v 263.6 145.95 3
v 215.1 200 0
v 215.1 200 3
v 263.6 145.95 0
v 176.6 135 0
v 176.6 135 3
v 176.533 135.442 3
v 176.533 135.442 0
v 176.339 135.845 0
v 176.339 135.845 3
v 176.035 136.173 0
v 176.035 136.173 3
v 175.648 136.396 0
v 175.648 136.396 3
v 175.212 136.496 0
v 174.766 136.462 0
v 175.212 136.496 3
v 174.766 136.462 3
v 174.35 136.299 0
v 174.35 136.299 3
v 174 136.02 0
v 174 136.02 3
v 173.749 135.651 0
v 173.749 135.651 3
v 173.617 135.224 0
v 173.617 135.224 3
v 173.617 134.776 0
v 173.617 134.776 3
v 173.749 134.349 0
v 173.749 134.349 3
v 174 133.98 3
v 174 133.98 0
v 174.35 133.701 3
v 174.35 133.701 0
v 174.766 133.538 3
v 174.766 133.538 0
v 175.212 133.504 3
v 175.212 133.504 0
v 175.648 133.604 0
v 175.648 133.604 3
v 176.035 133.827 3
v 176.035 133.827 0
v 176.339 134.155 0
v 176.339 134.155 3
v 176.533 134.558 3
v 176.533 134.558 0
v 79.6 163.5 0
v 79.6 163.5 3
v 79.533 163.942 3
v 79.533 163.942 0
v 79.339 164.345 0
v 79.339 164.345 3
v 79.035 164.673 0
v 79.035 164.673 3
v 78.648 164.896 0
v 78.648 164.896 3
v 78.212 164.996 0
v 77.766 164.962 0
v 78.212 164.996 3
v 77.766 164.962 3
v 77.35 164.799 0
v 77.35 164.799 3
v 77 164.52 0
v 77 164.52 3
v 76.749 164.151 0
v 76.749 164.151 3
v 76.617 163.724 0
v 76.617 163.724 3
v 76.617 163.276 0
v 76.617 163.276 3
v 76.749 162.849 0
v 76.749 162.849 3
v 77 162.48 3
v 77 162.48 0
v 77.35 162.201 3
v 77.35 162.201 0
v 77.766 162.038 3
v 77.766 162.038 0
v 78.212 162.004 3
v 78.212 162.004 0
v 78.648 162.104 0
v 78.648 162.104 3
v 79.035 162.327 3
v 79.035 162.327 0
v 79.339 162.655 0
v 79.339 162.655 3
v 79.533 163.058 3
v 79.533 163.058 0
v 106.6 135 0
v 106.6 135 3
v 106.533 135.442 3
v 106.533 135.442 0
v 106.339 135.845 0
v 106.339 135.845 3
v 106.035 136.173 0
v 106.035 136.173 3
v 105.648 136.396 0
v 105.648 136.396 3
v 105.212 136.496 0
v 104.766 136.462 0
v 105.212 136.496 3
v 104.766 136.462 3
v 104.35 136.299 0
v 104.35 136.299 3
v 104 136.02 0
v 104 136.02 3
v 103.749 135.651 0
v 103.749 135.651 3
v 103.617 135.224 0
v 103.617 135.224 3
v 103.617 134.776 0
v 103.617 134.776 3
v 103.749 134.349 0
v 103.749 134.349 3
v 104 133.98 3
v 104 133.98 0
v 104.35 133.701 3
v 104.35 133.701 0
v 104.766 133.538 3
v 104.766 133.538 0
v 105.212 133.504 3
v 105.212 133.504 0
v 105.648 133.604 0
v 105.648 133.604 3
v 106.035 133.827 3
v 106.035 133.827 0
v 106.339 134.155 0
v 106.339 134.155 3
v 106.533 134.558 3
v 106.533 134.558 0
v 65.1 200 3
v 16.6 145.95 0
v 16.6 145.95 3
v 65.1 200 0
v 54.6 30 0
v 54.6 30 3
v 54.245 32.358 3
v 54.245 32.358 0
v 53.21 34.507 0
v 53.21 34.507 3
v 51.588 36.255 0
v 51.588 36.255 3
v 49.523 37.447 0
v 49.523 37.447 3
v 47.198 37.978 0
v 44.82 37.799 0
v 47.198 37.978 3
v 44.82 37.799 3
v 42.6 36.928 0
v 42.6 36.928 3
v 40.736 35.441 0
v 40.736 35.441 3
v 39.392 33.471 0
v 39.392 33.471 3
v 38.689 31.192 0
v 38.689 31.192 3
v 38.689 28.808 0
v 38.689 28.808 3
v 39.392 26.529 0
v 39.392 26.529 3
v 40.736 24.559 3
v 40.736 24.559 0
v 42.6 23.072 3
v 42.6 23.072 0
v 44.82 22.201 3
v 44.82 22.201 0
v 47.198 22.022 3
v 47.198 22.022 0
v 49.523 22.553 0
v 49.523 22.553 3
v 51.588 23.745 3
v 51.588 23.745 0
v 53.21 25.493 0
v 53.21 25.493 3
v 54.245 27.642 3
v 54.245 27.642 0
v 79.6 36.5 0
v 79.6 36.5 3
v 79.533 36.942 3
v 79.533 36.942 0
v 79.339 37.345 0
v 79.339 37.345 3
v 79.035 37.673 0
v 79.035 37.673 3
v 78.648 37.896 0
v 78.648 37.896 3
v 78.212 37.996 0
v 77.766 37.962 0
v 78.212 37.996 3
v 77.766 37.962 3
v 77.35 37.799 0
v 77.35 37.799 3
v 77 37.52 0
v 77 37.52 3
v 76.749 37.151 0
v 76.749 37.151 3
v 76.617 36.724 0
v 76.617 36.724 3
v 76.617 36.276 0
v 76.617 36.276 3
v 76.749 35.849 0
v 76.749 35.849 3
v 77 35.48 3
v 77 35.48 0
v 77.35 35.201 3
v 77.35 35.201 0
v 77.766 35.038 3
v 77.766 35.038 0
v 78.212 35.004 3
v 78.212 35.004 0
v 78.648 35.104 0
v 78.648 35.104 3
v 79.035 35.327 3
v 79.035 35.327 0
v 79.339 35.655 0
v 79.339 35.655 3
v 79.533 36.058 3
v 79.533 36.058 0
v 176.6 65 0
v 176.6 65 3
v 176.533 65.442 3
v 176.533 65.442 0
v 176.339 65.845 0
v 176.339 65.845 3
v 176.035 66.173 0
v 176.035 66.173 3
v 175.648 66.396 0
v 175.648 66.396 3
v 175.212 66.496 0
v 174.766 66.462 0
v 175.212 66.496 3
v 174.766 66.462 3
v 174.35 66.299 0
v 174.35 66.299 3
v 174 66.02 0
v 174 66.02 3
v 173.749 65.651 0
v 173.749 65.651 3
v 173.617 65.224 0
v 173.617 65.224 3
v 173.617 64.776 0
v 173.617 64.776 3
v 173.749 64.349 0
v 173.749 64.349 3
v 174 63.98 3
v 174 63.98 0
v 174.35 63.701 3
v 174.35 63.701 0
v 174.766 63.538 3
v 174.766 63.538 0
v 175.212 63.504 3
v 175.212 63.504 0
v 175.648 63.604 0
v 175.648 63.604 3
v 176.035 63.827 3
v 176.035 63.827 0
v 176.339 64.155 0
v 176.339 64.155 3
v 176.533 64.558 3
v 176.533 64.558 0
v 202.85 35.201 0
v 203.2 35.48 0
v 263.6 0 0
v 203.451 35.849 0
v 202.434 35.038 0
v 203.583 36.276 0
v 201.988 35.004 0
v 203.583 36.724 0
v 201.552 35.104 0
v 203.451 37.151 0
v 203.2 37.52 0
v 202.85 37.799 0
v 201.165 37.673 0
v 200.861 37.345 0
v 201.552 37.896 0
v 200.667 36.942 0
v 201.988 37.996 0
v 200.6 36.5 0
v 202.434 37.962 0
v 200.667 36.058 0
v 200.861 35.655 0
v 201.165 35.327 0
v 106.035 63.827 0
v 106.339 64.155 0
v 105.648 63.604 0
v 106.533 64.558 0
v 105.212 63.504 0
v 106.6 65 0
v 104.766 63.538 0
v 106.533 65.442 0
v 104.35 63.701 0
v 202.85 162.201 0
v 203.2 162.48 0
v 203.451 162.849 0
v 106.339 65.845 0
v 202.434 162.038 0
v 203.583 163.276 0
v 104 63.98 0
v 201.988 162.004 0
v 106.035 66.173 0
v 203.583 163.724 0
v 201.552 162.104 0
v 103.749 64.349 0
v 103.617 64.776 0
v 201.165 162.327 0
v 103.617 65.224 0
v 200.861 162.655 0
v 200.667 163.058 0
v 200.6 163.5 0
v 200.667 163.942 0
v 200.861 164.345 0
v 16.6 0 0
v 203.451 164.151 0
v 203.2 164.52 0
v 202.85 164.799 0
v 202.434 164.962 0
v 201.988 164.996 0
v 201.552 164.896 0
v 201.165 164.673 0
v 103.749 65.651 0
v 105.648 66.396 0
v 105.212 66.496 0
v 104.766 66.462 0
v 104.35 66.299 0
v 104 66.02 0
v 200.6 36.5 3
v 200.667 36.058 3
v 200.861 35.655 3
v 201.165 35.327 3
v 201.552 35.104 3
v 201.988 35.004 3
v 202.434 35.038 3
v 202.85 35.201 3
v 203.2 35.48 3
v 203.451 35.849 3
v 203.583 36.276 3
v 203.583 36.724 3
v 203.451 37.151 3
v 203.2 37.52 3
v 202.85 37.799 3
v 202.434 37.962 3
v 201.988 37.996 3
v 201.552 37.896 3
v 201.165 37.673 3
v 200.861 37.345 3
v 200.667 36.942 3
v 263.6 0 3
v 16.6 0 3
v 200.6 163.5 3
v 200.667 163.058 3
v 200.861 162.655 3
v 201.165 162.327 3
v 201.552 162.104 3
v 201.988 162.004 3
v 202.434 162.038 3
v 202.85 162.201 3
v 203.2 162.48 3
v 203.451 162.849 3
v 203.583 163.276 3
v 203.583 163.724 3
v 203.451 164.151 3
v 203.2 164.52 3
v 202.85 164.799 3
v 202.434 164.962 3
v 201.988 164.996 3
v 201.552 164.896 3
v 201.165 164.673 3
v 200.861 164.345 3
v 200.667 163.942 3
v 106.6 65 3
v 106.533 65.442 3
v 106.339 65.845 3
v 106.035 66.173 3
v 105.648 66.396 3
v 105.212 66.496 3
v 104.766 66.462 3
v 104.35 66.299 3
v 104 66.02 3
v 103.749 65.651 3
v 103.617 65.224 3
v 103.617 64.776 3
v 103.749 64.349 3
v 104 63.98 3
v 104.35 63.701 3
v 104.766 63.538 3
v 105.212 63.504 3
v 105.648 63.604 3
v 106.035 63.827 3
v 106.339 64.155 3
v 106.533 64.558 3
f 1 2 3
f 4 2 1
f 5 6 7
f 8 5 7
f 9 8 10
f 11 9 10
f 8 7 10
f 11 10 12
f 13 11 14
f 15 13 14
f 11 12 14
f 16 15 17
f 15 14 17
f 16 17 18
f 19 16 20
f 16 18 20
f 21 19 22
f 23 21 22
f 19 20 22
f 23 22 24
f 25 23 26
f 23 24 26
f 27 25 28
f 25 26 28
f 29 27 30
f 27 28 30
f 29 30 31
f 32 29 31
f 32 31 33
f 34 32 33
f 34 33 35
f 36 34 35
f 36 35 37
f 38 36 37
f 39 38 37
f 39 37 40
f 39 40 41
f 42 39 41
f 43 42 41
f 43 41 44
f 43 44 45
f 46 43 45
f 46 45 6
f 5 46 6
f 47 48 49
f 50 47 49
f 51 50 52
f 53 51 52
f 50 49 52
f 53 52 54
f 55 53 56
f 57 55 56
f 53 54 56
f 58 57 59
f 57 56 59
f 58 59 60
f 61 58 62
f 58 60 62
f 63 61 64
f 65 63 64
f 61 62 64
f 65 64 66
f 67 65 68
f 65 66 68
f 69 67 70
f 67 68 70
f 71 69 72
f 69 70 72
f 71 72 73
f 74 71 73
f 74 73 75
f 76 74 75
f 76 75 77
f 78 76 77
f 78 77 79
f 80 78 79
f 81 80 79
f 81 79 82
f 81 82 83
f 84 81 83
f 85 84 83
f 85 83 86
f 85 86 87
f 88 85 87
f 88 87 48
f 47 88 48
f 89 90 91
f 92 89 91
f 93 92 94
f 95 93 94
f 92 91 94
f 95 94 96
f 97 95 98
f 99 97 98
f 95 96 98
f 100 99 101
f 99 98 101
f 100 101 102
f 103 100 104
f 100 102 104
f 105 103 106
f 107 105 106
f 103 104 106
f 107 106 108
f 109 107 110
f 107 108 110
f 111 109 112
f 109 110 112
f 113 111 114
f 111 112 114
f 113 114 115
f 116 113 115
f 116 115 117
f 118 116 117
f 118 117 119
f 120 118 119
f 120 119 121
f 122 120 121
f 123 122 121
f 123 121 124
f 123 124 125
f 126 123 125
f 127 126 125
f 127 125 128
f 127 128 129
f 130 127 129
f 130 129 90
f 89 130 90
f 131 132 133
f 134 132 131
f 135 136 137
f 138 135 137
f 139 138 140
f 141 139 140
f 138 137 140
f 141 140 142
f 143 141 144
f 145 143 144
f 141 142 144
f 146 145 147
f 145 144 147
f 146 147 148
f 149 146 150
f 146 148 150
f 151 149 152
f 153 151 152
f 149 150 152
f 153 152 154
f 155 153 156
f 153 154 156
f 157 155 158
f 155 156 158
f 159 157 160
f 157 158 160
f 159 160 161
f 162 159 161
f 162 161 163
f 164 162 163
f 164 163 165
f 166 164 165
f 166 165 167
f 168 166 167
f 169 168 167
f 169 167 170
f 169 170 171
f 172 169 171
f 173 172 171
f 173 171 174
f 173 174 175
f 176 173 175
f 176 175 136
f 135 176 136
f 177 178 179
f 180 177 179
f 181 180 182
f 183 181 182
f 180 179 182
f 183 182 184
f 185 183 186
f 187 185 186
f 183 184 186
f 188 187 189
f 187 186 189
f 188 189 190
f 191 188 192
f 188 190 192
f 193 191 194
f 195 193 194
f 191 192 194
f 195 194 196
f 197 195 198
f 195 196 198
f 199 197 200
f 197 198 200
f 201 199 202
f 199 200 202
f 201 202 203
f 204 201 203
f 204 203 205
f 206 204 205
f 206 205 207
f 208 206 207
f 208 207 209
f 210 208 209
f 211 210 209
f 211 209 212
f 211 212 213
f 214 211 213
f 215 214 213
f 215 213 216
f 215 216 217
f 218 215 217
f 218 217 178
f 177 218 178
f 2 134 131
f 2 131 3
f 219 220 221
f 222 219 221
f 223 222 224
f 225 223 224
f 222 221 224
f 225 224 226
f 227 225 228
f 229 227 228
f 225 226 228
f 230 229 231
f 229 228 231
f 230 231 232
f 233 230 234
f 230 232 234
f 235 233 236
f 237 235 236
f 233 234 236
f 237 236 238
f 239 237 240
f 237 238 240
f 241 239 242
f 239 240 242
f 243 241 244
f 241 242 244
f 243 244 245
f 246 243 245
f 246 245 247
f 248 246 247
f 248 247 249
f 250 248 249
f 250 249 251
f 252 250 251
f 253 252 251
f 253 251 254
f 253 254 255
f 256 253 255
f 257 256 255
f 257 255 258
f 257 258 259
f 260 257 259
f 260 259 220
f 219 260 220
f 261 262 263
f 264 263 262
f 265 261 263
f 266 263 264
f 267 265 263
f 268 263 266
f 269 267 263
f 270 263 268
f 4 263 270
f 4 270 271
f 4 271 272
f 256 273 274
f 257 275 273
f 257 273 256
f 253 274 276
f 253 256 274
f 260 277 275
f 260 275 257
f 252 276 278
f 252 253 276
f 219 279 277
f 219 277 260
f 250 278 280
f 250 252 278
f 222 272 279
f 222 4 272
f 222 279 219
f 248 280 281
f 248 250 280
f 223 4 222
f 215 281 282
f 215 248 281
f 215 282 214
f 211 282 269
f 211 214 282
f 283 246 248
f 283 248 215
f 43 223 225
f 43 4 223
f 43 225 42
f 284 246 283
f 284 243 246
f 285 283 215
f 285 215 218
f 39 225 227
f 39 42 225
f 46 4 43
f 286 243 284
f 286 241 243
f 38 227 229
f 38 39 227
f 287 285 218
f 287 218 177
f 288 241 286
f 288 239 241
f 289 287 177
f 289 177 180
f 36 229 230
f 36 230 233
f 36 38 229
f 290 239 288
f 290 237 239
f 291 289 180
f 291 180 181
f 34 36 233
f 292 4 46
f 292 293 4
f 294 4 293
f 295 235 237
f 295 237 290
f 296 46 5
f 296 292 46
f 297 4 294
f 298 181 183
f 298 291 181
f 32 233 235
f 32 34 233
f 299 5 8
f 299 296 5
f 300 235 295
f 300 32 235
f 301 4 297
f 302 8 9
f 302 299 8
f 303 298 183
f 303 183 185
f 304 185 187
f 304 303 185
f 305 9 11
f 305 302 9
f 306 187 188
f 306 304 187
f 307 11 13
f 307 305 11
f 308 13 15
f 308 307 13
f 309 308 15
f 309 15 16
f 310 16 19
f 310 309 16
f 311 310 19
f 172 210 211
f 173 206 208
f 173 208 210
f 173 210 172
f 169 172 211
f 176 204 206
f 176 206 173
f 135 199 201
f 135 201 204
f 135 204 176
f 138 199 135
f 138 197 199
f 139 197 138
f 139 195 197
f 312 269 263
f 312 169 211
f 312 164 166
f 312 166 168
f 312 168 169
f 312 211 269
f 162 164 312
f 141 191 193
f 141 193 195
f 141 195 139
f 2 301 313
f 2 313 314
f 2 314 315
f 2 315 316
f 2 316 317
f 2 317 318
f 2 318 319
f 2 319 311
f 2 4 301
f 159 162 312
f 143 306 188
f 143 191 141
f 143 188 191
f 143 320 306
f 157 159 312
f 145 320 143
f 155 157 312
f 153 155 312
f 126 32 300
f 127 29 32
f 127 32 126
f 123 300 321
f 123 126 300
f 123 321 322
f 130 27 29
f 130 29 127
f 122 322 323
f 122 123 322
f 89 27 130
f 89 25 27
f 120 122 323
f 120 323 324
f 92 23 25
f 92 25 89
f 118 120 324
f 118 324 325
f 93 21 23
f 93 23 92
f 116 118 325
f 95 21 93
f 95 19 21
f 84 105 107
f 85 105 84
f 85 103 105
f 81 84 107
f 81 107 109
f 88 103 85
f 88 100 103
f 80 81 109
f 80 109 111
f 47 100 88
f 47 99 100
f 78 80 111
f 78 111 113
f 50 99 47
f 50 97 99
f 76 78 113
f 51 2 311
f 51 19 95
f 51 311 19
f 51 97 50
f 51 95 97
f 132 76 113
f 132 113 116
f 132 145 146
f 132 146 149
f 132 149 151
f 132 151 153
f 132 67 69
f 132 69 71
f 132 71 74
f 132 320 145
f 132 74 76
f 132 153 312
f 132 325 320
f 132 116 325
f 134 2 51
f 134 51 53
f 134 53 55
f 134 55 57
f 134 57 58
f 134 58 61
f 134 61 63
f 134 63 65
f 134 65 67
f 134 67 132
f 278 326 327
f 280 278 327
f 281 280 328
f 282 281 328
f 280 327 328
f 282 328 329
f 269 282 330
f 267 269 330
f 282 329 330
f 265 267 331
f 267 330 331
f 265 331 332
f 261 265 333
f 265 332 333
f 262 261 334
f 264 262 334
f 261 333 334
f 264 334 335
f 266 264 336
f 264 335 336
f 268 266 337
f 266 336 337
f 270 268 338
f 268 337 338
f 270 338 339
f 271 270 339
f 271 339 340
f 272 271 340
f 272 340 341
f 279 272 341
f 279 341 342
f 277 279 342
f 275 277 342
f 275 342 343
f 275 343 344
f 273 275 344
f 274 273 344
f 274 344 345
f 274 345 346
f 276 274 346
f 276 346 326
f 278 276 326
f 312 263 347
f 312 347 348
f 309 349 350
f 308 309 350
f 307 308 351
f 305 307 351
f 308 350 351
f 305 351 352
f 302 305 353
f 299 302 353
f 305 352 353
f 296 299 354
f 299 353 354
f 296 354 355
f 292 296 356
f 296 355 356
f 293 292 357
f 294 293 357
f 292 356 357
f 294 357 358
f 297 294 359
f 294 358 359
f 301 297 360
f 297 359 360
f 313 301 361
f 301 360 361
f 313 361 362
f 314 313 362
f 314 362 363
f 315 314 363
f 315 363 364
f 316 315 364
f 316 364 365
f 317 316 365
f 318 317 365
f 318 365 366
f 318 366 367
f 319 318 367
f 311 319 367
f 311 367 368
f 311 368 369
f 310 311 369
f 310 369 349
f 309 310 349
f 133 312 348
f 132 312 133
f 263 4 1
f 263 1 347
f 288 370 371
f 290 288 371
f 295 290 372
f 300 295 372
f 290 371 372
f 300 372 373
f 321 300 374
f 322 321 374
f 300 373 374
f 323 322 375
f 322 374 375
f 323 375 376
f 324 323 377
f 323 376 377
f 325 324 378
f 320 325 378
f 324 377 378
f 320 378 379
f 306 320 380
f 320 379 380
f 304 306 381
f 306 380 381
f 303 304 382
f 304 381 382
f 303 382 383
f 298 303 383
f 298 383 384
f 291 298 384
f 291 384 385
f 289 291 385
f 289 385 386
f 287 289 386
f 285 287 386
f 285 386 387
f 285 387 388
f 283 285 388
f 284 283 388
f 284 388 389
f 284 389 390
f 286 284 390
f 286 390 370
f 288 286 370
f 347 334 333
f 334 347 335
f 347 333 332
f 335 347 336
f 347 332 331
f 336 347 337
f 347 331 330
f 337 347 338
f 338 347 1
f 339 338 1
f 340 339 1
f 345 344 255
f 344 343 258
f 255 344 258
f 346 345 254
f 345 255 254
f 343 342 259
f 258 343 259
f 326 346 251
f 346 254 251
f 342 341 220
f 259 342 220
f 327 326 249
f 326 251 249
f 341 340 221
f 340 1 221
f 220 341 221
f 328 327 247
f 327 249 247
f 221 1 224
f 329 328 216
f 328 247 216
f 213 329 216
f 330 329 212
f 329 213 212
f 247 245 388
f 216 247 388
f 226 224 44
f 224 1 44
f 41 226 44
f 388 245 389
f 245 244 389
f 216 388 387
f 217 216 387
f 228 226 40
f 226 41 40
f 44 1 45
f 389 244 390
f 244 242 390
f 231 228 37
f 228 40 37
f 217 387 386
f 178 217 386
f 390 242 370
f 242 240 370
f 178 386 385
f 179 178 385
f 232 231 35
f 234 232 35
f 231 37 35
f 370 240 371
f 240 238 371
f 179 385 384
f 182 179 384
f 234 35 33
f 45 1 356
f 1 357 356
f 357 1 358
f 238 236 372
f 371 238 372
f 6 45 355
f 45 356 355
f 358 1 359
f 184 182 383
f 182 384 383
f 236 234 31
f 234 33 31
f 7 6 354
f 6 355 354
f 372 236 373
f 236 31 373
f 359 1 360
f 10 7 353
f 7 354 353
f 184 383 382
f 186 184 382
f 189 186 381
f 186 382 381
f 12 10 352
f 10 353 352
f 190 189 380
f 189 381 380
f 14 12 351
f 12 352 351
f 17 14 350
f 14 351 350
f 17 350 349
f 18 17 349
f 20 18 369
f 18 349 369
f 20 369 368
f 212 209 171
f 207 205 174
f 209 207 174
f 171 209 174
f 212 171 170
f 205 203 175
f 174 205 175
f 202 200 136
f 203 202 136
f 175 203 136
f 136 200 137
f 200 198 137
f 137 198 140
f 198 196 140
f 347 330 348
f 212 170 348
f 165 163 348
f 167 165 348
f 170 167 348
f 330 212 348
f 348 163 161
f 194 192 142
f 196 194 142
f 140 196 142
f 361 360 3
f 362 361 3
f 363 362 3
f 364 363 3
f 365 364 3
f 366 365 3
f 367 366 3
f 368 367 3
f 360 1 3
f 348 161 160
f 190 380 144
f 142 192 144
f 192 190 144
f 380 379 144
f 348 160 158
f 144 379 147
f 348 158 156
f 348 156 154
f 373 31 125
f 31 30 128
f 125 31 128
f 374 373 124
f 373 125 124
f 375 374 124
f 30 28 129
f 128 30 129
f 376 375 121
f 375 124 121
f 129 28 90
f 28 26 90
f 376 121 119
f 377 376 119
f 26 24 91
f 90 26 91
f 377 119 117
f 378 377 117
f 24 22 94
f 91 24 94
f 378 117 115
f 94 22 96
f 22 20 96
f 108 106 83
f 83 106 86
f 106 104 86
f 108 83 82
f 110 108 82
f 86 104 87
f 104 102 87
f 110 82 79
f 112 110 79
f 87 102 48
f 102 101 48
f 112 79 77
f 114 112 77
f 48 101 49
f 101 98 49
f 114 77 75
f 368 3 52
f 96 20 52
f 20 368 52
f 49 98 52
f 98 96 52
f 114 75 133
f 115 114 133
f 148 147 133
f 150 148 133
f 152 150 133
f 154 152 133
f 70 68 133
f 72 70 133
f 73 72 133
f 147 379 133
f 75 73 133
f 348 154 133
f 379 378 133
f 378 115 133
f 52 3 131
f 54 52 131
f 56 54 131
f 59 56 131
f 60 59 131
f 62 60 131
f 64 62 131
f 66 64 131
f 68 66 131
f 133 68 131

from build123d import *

# Parameters (mm, degrees)
BOSS_EXTRU_1_DEPTH      = 3
ENL_V_MAT_EXTRU_1_DEPTH = 345.268848431
ESQUISSE3_R             = 1.5
ENL_V_MAT_EXTRU_2_DEPTH = 331.898715622
ESQUISSE4_R             = 8
ENL_V_MAT_EXTRU_3_DEPTH = 331.898715622
ESQUISSE5_R             = 1.5
ENL_V_MAT_EXTRU_4_DEPTH = 331.898715622


with BuildPart() as part:
    # Esquisse1 → Boss.-Extru.1 (new body)
    with BuildSketch(Plane.XY):
        Polygon((0, 0), (0, 127.45), (65.1, 200), (215.1, 200), (280.2, 127.45), (280.2, 0), align=None)
    extrude(amount=BOSS_EXTRU_1_DEPTH)

    # Esquisse2 → Enlèv. mat.-Extru.1 (cut, through all)
    with BuildSketch(Plane(origin=(0, 0, 0), x_dir=(-1, 0, 0), z_dir=(0, 0, -1))):
        Polygon((-16.6, 0), (-16.6, 145.969439351), (0, 127.45), (0, 0), align=None)
        Polygon((-280.2, 127.45), (-263.6, 145.969439351), (-263.6, 0), (-280.2, 0), align=None)
    extrude(amount=-ENL_V_MAT_EXTRU_1_DEPTH, mode=Mode.SUBTRACT)

    # Esquisse3 → Enlèv. mat.-Extru.2 (cut, through all)
    with BuildSketch(Plane.XY.offset(3)):
        with Locations((78.1, 163.5)):
            Circle(ESQUISSE3_R)
        with Locations((78.1, 36.5)):
            Circle(ESQUISSE3_R)
        with Locations(Location((202.1, 36.5, 0), (0, 0, 180))):
            Circle(ESQUISSE3_R)
        with Locations(Location((202.1, 163.5, 0), (0, 0, 180))):
            Circle(ESQUISSE3_R)
    extrude(amount=-ENL_V_MAT_EXTRU_2_DEPTH, mode=Mode.SUBTRACT)

    # Esquisse4 → Enlèv. mat.-Extru.3 (cut, through all)
    with BuildSketch(Plane.XY.offset(3)):
        with Locations((46.6, 30)):
            Circle(ESQUISSE4_R)
    extrude(amount=-ENL_V_MAT_EXTRU_3_DEPTH, mode=Mode.SUBTRACT)

    # Esquisse5 → Enlèv. mat.-Extru.4 (cut, through all)
    with BuildSketch(Plane.XY.offset(3)):
        with Locations((105.1, 65)):
            Circle(ESQUISSE5_R)
        with Locations((105.1, 135)):
            Circle(ESQUISSE5_R)
        with Locations((175.1, 135)):
            Circle(ESQUISSE5_R)
        with Locations((175.1, 65)):
            Circle(ESQUISSE5_R)
    extrude(amount=-ENL_V_MAT_EXTRU_4_DEPTH, mode=Mode.SUBTRACT)


solid = part.part
